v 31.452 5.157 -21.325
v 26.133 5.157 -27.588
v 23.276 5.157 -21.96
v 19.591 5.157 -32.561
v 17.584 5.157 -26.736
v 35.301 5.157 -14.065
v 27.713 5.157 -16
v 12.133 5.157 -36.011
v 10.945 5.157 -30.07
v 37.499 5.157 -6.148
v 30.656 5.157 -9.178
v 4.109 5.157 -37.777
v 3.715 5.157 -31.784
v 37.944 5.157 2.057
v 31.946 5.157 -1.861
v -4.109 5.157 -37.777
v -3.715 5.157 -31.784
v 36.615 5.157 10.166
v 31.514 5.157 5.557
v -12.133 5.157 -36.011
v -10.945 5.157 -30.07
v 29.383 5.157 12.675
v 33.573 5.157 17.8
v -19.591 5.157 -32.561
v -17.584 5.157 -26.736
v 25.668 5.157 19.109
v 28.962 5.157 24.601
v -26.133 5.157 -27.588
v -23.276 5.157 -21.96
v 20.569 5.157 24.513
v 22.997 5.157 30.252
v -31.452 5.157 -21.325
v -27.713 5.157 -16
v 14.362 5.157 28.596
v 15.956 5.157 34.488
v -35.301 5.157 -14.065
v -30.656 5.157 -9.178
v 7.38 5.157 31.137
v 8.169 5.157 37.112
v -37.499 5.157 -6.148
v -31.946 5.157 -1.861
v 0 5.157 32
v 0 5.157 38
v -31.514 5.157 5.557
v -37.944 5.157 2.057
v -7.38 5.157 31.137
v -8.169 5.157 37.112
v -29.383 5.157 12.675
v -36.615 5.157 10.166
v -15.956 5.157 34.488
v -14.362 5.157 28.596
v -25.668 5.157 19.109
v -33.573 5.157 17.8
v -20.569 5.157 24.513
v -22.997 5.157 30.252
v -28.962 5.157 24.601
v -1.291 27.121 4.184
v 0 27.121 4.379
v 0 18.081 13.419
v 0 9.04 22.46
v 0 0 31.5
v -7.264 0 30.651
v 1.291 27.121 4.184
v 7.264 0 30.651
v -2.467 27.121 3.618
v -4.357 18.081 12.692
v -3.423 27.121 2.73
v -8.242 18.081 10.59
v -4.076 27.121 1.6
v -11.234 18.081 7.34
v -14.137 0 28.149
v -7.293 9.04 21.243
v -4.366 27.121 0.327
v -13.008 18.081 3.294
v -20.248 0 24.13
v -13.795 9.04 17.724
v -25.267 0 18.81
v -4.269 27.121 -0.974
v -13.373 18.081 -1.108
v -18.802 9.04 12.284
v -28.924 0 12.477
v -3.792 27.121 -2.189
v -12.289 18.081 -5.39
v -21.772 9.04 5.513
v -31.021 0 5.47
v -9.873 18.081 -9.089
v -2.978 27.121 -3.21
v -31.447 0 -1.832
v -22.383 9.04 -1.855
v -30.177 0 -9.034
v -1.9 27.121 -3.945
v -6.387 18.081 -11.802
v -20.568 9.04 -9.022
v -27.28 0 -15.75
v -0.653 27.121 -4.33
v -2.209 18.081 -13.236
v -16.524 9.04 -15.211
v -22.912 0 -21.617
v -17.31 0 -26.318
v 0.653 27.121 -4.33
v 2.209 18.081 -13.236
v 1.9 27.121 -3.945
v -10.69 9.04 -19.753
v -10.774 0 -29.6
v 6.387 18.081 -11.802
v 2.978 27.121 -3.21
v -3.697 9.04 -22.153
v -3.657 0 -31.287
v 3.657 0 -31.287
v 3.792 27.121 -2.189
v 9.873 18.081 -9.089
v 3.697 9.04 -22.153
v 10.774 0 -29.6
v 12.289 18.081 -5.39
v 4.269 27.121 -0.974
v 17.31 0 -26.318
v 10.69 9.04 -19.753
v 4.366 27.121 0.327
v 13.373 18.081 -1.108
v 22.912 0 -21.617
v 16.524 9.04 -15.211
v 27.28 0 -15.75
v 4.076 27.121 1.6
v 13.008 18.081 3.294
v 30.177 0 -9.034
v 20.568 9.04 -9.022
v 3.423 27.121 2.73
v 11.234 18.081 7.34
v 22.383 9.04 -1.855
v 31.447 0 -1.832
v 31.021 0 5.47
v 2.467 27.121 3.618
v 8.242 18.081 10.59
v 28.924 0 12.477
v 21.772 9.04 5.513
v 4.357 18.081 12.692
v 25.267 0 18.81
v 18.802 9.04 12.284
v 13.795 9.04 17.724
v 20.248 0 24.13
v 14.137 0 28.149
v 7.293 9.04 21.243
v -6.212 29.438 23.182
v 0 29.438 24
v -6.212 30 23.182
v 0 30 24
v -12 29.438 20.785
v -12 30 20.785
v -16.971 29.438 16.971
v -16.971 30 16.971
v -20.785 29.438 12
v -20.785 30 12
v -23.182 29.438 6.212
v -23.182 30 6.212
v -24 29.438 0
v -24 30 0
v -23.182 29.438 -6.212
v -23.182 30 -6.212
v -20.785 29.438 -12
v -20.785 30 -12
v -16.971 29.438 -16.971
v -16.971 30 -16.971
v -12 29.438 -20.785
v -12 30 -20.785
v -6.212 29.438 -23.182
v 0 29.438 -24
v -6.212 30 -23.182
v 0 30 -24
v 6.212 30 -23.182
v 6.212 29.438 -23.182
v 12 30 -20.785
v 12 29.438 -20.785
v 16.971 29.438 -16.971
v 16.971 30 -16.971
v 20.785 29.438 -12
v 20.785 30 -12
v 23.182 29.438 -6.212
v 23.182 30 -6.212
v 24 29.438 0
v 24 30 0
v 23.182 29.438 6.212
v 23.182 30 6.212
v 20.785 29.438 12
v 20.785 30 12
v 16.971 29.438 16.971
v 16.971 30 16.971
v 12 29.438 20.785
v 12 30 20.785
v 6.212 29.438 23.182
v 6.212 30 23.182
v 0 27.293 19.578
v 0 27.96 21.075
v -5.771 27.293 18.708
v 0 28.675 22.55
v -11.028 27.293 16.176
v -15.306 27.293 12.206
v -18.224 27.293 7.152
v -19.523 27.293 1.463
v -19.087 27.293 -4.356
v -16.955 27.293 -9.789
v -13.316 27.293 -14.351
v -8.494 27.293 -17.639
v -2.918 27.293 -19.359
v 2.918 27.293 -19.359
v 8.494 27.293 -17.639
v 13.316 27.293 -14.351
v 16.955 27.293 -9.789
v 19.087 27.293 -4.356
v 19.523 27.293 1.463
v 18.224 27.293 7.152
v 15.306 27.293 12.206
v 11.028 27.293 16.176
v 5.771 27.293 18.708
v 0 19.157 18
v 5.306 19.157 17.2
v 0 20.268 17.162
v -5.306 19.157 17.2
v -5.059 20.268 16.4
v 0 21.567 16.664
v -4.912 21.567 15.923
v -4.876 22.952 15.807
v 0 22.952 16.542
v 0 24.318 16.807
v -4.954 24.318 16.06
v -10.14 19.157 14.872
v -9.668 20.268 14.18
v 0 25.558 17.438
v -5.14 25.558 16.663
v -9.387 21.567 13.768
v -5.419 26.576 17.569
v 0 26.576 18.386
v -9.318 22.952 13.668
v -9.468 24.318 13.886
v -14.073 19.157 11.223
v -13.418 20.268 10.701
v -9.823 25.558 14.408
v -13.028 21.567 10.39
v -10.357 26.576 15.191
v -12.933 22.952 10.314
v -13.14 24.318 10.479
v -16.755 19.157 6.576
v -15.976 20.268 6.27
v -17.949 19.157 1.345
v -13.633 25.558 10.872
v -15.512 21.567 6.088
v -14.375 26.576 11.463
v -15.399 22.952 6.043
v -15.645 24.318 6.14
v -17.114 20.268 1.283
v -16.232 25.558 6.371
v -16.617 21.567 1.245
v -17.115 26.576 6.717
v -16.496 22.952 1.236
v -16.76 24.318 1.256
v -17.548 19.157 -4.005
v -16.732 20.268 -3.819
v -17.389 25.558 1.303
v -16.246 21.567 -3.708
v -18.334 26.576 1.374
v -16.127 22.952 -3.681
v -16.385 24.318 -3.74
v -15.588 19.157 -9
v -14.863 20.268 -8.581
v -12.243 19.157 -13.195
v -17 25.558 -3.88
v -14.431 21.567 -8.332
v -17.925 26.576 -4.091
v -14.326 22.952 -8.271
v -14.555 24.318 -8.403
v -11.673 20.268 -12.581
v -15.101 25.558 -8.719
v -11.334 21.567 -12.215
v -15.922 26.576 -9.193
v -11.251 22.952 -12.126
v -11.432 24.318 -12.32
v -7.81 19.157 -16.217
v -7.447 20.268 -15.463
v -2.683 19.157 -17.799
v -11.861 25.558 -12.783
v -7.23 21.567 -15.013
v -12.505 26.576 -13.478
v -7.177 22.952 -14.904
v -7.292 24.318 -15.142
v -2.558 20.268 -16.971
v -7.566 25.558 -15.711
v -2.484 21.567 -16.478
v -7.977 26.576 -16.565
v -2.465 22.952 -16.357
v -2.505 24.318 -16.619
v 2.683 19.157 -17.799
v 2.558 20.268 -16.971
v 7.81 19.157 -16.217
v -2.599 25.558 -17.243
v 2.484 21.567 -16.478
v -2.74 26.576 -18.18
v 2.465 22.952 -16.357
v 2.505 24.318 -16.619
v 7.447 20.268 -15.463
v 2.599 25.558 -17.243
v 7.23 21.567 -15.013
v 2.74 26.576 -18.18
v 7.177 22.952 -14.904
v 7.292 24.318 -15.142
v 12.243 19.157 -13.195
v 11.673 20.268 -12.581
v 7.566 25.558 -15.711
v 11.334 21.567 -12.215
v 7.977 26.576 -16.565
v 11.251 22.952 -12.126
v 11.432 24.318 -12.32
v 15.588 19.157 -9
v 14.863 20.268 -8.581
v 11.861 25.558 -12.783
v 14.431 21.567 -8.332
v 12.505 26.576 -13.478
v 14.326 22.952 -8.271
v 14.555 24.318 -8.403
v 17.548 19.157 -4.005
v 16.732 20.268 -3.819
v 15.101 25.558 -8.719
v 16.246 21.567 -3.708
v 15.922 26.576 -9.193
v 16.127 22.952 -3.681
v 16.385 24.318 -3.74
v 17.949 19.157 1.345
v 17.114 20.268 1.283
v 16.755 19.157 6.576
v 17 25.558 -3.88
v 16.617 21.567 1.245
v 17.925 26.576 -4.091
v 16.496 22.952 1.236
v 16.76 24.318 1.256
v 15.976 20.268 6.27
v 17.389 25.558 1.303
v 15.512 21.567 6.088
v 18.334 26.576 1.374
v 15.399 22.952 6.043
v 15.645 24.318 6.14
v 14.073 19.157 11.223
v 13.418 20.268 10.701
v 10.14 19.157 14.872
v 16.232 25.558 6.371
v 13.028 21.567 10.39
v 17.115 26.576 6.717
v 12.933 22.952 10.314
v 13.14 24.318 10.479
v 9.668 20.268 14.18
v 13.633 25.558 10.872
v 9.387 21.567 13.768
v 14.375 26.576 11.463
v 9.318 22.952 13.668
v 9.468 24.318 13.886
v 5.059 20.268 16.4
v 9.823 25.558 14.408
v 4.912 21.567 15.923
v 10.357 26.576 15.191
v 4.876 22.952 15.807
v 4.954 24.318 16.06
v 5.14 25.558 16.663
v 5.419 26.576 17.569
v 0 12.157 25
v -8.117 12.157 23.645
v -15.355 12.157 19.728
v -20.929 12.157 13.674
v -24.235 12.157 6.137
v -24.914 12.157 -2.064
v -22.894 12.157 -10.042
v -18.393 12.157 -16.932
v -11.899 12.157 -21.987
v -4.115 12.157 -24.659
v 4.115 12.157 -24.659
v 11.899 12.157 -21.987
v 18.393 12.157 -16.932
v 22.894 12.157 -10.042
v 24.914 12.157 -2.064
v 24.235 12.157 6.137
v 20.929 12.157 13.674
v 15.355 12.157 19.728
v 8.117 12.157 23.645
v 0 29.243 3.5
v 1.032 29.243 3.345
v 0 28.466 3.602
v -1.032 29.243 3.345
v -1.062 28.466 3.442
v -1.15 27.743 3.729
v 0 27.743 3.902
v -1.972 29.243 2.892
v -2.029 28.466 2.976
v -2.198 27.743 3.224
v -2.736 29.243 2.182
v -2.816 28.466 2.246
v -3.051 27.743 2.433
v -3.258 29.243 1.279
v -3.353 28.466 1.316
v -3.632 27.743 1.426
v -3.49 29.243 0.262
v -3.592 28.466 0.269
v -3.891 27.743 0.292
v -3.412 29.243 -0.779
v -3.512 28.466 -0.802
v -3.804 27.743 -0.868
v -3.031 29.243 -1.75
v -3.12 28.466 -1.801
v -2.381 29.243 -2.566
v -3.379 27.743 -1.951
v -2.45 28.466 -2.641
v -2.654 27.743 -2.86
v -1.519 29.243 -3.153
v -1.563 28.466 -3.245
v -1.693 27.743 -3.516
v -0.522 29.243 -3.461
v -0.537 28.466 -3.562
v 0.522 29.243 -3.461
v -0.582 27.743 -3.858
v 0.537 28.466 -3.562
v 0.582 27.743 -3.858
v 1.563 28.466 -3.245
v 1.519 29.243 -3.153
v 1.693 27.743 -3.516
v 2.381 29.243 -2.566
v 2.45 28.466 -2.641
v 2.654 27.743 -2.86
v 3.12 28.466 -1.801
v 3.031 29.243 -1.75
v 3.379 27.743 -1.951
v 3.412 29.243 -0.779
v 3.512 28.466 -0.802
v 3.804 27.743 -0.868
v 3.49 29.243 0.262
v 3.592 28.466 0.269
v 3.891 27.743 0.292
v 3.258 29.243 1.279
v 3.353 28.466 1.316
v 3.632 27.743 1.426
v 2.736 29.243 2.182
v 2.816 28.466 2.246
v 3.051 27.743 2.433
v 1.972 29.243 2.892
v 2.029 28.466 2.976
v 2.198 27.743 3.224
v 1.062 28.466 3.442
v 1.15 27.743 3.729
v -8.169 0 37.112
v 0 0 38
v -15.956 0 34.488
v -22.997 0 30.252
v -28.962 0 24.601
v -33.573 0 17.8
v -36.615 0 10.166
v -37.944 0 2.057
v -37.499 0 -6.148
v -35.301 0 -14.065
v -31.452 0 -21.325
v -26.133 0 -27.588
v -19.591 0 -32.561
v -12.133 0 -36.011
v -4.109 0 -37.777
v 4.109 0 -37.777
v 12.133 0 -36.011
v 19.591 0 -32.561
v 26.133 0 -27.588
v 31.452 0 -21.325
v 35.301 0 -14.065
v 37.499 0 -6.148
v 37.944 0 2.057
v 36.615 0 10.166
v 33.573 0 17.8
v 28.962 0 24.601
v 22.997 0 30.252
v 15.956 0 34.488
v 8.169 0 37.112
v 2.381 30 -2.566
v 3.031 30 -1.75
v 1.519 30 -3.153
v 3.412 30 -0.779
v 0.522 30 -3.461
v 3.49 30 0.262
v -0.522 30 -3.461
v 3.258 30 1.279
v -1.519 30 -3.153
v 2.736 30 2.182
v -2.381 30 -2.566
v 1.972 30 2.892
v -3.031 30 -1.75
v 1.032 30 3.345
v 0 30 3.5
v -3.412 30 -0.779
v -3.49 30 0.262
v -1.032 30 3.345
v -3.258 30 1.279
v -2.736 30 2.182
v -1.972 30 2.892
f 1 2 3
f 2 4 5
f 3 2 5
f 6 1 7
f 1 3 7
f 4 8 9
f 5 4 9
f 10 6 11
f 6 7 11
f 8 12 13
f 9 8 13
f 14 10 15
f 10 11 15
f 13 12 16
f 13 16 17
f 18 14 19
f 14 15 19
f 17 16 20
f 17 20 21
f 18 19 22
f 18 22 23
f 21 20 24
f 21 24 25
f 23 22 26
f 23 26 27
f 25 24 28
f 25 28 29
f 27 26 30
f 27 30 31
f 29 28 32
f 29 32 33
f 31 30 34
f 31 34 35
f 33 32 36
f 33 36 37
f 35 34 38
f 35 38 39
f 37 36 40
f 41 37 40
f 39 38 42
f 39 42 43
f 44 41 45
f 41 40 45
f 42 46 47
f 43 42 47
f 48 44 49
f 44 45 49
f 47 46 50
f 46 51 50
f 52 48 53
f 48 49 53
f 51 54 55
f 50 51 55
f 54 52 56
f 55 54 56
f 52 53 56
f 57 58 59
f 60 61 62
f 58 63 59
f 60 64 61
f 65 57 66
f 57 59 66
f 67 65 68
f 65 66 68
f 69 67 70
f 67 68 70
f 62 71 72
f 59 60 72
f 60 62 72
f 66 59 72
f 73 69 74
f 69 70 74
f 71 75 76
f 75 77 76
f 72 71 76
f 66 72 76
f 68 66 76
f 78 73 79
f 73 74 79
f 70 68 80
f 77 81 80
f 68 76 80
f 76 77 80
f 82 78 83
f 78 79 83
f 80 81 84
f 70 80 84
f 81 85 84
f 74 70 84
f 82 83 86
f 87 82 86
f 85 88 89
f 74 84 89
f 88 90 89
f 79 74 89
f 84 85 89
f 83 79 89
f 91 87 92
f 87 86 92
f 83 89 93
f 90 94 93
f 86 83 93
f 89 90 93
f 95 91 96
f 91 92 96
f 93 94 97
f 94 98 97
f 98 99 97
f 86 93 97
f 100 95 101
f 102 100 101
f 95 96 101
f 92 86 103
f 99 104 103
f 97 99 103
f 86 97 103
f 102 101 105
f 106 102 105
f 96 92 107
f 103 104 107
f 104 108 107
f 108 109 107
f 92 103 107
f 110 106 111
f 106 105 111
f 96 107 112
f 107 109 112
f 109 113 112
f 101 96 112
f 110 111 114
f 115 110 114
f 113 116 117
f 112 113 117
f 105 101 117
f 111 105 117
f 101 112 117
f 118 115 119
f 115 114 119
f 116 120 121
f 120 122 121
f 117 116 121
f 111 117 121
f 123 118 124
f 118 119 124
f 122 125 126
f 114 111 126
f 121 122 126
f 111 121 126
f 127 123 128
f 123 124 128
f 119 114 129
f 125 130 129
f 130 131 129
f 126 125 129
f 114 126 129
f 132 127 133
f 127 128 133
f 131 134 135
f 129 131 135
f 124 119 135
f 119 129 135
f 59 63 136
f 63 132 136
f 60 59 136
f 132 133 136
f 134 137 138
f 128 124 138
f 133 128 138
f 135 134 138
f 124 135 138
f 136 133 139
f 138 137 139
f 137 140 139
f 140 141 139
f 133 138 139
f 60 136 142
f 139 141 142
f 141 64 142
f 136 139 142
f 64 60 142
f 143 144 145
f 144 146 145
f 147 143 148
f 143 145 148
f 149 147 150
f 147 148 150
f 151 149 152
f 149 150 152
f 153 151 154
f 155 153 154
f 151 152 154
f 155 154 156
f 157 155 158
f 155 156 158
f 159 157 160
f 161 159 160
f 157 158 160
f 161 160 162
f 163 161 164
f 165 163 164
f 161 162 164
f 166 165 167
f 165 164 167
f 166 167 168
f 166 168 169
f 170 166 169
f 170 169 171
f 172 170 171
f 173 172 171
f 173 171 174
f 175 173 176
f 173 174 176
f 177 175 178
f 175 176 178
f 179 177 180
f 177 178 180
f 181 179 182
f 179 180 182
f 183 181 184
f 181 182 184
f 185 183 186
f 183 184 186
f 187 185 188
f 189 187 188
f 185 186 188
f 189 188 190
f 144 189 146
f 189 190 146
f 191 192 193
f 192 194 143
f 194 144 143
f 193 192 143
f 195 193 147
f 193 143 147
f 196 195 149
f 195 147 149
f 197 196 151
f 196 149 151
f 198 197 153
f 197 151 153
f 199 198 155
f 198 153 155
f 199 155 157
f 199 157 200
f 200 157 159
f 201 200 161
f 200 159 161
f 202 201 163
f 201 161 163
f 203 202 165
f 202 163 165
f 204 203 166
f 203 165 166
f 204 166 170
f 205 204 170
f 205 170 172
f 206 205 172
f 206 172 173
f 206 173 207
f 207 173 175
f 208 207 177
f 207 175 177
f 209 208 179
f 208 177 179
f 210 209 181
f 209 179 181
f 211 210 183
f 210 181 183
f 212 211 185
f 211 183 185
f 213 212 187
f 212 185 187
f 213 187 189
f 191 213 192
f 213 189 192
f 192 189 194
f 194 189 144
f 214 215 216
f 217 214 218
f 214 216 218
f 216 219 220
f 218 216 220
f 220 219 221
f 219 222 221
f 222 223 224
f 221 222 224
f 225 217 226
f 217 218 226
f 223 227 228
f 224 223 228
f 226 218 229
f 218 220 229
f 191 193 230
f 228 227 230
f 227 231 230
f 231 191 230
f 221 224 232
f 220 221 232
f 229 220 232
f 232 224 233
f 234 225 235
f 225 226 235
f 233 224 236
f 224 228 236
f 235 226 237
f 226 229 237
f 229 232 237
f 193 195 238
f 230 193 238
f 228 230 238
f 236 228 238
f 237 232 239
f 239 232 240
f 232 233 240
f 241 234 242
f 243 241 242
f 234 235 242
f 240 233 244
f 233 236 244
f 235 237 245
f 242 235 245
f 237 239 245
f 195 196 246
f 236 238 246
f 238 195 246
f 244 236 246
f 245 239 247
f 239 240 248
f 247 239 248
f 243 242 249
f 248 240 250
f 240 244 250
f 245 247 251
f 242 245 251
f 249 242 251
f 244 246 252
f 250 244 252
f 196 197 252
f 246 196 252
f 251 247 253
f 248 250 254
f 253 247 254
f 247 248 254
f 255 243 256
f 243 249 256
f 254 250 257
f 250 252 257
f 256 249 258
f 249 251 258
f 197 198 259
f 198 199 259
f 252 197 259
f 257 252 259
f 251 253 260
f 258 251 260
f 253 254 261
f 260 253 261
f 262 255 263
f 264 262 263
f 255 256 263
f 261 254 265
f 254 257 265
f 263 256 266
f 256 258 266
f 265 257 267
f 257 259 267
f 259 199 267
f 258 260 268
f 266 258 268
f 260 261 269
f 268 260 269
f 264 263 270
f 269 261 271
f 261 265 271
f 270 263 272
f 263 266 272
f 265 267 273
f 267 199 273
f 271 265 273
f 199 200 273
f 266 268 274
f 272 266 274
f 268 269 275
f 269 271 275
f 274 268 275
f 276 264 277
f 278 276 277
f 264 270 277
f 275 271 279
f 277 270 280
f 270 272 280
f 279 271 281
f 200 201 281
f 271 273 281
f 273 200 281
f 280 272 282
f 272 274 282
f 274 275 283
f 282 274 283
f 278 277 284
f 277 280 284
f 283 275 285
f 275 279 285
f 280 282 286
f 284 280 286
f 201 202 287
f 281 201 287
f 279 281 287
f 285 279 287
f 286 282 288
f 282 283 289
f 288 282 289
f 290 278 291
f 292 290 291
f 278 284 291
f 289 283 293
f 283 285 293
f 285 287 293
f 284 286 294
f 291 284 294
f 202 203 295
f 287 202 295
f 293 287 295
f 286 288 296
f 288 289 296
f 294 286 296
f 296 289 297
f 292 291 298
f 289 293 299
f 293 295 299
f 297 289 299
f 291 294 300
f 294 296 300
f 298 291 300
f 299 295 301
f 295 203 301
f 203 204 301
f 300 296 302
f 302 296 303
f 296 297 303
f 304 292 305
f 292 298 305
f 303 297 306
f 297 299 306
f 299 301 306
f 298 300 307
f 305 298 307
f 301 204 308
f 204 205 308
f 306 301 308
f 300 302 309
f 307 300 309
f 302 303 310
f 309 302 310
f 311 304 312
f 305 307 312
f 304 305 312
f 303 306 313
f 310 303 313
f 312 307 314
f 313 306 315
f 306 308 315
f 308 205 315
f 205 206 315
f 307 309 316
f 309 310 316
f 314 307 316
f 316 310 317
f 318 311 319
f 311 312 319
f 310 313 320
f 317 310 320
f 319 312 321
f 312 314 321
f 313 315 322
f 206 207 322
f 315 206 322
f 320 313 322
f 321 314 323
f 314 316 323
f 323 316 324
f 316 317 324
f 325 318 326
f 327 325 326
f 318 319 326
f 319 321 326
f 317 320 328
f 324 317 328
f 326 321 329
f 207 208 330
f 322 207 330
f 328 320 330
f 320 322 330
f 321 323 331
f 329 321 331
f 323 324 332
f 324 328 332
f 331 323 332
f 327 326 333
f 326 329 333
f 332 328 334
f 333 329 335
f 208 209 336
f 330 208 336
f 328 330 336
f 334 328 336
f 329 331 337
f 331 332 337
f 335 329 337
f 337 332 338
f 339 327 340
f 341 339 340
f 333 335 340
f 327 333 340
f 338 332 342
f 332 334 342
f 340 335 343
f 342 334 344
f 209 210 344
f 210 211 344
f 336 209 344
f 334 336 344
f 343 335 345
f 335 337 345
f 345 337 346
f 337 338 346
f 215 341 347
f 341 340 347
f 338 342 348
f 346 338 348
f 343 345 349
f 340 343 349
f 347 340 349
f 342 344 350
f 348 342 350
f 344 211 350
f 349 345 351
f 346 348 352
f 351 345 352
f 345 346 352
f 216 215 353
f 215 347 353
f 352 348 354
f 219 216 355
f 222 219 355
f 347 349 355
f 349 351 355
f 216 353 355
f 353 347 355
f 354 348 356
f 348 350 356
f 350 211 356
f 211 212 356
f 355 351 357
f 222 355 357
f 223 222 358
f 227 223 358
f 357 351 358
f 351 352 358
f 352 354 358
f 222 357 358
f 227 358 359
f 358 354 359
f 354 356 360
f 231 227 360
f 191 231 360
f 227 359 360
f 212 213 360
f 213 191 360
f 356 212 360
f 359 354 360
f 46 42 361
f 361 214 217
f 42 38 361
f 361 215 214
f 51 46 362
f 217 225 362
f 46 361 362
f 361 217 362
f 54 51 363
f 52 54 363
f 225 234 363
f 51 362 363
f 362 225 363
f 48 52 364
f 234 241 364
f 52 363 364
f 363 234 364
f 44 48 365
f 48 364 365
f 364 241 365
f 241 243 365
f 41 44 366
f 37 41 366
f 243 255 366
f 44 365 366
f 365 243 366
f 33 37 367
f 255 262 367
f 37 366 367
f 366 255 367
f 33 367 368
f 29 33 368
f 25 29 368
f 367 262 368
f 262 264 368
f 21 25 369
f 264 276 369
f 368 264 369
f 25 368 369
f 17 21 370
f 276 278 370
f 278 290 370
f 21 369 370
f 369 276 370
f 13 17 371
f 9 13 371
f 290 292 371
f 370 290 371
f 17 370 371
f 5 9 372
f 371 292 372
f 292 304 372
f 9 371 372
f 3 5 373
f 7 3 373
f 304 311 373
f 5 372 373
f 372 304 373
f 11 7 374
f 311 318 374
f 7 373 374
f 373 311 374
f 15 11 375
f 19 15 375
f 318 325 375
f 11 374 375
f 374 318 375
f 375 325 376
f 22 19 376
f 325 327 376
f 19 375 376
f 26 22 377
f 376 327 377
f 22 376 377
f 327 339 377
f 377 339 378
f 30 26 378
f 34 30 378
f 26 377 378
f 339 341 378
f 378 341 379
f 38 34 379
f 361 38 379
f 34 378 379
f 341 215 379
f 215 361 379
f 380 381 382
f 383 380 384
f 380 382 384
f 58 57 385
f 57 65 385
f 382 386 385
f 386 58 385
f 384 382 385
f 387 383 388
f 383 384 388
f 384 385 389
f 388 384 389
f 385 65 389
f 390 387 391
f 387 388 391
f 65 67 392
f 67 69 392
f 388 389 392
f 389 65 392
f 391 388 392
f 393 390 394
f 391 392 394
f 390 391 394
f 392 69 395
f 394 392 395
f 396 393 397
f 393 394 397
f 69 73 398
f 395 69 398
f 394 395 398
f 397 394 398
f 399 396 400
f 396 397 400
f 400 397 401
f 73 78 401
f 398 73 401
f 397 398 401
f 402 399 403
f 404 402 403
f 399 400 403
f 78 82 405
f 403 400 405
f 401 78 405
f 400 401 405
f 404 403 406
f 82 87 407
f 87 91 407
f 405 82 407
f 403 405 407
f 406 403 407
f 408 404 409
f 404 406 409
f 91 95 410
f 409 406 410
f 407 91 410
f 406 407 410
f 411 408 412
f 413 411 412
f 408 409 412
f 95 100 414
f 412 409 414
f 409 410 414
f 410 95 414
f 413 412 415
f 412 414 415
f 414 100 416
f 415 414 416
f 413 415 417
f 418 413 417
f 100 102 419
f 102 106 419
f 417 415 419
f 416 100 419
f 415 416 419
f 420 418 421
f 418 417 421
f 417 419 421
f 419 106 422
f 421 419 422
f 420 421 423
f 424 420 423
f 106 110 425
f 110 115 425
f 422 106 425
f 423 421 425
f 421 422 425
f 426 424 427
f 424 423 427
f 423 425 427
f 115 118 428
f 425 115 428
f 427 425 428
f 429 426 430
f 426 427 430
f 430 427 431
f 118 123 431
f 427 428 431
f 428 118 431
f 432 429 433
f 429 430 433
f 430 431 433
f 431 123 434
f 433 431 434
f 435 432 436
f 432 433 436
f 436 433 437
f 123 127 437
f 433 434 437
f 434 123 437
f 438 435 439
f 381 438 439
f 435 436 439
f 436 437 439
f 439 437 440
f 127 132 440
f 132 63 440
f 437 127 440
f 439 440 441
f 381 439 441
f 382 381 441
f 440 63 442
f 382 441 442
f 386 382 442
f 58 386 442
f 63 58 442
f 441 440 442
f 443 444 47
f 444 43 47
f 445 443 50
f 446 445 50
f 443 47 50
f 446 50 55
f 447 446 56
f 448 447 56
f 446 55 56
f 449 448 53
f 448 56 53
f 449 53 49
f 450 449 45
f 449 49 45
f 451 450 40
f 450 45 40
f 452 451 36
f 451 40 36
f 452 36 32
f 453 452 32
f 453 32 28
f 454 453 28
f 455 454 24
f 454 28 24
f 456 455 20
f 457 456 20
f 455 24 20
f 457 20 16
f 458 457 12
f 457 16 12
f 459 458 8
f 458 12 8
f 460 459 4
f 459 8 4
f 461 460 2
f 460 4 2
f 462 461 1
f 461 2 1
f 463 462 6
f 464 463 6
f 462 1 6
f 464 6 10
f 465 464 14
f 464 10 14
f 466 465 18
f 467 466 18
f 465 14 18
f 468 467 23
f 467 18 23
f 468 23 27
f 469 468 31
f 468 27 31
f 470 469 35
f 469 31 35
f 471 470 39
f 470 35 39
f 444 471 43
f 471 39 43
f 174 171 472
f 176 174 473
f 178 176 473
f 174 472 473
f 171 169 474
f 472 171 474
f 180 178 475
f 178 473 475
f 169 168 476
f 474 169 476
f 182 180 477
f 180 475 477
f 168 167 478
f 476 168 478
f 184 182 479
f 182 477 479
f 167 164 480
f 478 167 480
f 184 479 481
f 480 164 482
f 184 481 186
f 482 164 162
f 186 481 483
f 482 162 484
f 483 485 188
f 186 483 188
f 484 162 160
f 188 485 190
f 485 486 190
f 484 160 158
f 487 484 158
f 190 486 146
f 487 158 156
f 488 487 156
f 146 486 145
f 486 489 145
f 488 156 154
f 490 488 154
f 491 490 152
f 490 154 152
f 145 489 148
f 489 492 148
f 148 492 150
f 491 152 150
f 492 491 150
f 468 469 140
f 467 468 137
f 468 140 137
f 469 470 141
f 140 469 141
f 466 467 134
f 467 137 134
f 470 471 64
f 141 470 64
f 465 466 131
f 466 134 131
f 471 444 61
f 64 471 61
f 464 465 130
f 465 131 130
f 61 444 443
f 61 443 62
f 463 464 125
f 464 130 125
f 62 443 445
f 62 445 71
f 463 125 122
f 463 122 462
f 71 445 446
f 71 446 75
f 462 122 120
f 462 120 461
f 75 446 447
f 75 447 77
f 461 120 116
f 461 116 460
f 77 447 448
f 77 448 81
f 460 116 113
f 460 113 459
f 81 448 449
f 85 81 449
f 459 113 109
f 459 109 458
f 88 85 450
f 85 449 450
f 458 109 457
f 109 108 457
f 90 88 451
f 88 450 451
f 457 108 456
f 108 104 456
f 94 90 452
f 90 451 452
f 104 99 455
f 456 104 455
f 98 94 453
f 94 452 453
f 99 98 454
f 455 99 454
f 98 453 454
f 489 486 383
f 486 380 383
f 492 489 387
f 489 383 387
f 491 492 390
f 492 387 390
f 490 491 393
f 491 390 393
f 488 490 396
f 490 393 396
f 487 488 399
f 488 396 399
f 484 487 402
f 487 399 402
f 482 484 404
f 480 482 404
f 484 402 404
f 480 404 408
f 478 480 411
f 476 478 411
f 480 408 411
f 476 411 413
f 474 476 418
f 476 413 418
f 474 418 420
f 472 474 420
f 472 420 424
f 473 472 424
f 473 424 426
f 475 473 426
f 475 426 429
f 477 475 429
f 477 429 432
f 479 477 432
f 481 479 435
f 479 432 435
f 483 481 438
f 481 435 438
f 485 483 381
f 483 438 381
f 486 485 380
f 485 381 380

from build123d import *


with BuildPart() as part:
    # Esquisse1 → Révolution1 (revolve)
    with BuildSketch(Plane.XY):
        with BuildLine():
            Line((31.5, 0), (38, 0))
            Line((38, 0), (38, 5.156854249))
            Line((38, 5.156854249), (32, 5.156854249))
            Line((32, 5.156854249), (17.99973552, 19.157118729))
            ThreePointArc((17.99973552, 19.157118729), (16.626709378, 23.64451305), (19.57751766, 27.293436049))
            ThreePointArc((19.57751766, 27.293436049), (21.815123989, 28.31126724), (24, 29.43784579))
            Line((24, 29.43784579), (24, 30))
            Line((24, 30), (3.5, 30))
            Line((3.5, 30), (3.5, 29.242640687))
            ThreePointArc((3.5, 29.242640687), (3.728361402, 28.09459039), (4.378679656, 27.121320344))
            Line((4.378679656, 27.121320344), (31.5, 0))
        make_face()
    revolve(axis=Axis((0, 49.284488144, 0), (0, -1, 0)))


solid = part.part
